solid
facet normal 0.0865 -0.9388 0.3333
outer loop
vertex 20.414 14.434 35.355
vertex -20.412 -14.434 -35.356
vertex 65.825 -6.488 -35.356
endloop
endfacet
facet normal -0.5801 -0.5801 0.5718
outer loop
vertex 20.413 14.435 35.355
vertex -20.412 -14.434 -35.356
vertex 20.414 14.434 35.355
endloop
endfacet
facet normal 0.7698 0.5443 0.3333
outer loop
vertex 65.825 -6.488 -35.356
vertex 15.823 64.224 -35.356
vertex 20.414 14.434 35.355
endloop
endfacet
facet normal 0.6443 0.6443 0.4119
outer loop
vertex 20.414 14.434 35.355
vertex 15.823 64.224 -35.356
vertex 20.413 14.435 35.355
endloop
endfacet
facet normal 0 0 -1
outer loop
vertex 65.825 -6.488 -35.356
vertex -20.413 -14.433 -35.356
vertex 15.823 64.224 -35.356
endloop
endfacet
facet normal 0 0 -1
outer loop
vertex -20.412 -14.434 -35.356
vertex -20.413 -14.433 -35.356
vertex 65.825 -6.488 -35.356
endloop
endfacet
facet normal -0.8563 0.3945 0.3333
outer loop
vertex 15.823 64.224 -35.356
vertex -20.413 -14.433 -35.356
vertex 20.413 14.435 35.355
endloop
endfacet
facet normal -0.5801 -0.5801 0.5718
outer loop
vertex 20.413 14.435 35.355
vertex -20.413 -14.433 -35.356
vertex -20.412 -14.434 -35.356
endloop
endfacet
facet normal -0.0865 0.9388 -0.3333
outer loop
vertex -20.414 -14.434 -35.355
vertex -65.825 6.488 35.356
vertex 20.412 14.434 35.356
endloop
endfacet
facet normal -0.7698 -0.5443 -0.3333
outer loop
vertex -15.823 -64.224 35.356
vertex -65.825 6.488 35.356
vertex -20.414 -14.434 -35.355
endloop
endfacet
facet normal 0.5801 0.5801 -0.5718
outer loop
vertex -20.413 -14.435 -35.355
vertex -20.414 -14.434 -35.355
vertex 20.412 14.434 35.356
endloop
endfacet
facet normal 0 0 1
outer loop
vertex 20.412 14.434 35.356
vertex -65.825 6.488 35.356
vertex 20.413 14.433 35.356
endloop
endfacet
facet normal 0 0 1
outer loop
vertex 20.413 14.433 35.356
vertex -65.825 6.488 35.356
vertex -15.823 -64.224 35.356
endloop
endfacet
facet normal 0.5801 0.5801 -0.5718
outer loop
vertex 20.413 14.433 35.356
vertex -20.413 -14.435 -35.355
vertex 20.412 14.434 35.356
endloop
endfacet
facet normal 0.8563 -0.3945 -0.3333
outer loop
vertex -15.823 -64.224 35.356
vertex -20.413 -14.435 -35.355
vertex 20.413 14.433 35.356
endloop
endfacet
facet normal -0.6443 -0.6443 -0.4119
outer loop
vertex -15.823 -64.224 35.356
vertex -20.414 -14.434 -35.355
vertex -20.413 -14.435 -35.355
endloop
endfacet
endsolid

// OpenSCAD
$fn=3;
r=50;
triangleSide=(3*r)/sqrt(3);
triangleHeight=(3*r)/2;
magicalConst=0.816; // cos(arccos(1/3)/2)

sinArccosOfThird=(2*sqrt(2))/3;

A=[triangleHeight/3, sinArccosOfThird*triangleHeight,0];
B=[triangleHeight,0,0];

v=A-B;

rotate(70.53/2, v) {
    rotate_extrude(angle=70.53) {
        translate([ r/2 + 0.001, 0.00, 0.00 ]) {
            circle(r);
        }
    }
}

rotate(70.53/2, v) {
    rotate([0,0,180]) {
        rotate_extrude(angle=70.53) {
            translate([ r/2 + 0.001, 0.00, 0.00 ]) {
                circle(r);
            }
        }
    }

}
